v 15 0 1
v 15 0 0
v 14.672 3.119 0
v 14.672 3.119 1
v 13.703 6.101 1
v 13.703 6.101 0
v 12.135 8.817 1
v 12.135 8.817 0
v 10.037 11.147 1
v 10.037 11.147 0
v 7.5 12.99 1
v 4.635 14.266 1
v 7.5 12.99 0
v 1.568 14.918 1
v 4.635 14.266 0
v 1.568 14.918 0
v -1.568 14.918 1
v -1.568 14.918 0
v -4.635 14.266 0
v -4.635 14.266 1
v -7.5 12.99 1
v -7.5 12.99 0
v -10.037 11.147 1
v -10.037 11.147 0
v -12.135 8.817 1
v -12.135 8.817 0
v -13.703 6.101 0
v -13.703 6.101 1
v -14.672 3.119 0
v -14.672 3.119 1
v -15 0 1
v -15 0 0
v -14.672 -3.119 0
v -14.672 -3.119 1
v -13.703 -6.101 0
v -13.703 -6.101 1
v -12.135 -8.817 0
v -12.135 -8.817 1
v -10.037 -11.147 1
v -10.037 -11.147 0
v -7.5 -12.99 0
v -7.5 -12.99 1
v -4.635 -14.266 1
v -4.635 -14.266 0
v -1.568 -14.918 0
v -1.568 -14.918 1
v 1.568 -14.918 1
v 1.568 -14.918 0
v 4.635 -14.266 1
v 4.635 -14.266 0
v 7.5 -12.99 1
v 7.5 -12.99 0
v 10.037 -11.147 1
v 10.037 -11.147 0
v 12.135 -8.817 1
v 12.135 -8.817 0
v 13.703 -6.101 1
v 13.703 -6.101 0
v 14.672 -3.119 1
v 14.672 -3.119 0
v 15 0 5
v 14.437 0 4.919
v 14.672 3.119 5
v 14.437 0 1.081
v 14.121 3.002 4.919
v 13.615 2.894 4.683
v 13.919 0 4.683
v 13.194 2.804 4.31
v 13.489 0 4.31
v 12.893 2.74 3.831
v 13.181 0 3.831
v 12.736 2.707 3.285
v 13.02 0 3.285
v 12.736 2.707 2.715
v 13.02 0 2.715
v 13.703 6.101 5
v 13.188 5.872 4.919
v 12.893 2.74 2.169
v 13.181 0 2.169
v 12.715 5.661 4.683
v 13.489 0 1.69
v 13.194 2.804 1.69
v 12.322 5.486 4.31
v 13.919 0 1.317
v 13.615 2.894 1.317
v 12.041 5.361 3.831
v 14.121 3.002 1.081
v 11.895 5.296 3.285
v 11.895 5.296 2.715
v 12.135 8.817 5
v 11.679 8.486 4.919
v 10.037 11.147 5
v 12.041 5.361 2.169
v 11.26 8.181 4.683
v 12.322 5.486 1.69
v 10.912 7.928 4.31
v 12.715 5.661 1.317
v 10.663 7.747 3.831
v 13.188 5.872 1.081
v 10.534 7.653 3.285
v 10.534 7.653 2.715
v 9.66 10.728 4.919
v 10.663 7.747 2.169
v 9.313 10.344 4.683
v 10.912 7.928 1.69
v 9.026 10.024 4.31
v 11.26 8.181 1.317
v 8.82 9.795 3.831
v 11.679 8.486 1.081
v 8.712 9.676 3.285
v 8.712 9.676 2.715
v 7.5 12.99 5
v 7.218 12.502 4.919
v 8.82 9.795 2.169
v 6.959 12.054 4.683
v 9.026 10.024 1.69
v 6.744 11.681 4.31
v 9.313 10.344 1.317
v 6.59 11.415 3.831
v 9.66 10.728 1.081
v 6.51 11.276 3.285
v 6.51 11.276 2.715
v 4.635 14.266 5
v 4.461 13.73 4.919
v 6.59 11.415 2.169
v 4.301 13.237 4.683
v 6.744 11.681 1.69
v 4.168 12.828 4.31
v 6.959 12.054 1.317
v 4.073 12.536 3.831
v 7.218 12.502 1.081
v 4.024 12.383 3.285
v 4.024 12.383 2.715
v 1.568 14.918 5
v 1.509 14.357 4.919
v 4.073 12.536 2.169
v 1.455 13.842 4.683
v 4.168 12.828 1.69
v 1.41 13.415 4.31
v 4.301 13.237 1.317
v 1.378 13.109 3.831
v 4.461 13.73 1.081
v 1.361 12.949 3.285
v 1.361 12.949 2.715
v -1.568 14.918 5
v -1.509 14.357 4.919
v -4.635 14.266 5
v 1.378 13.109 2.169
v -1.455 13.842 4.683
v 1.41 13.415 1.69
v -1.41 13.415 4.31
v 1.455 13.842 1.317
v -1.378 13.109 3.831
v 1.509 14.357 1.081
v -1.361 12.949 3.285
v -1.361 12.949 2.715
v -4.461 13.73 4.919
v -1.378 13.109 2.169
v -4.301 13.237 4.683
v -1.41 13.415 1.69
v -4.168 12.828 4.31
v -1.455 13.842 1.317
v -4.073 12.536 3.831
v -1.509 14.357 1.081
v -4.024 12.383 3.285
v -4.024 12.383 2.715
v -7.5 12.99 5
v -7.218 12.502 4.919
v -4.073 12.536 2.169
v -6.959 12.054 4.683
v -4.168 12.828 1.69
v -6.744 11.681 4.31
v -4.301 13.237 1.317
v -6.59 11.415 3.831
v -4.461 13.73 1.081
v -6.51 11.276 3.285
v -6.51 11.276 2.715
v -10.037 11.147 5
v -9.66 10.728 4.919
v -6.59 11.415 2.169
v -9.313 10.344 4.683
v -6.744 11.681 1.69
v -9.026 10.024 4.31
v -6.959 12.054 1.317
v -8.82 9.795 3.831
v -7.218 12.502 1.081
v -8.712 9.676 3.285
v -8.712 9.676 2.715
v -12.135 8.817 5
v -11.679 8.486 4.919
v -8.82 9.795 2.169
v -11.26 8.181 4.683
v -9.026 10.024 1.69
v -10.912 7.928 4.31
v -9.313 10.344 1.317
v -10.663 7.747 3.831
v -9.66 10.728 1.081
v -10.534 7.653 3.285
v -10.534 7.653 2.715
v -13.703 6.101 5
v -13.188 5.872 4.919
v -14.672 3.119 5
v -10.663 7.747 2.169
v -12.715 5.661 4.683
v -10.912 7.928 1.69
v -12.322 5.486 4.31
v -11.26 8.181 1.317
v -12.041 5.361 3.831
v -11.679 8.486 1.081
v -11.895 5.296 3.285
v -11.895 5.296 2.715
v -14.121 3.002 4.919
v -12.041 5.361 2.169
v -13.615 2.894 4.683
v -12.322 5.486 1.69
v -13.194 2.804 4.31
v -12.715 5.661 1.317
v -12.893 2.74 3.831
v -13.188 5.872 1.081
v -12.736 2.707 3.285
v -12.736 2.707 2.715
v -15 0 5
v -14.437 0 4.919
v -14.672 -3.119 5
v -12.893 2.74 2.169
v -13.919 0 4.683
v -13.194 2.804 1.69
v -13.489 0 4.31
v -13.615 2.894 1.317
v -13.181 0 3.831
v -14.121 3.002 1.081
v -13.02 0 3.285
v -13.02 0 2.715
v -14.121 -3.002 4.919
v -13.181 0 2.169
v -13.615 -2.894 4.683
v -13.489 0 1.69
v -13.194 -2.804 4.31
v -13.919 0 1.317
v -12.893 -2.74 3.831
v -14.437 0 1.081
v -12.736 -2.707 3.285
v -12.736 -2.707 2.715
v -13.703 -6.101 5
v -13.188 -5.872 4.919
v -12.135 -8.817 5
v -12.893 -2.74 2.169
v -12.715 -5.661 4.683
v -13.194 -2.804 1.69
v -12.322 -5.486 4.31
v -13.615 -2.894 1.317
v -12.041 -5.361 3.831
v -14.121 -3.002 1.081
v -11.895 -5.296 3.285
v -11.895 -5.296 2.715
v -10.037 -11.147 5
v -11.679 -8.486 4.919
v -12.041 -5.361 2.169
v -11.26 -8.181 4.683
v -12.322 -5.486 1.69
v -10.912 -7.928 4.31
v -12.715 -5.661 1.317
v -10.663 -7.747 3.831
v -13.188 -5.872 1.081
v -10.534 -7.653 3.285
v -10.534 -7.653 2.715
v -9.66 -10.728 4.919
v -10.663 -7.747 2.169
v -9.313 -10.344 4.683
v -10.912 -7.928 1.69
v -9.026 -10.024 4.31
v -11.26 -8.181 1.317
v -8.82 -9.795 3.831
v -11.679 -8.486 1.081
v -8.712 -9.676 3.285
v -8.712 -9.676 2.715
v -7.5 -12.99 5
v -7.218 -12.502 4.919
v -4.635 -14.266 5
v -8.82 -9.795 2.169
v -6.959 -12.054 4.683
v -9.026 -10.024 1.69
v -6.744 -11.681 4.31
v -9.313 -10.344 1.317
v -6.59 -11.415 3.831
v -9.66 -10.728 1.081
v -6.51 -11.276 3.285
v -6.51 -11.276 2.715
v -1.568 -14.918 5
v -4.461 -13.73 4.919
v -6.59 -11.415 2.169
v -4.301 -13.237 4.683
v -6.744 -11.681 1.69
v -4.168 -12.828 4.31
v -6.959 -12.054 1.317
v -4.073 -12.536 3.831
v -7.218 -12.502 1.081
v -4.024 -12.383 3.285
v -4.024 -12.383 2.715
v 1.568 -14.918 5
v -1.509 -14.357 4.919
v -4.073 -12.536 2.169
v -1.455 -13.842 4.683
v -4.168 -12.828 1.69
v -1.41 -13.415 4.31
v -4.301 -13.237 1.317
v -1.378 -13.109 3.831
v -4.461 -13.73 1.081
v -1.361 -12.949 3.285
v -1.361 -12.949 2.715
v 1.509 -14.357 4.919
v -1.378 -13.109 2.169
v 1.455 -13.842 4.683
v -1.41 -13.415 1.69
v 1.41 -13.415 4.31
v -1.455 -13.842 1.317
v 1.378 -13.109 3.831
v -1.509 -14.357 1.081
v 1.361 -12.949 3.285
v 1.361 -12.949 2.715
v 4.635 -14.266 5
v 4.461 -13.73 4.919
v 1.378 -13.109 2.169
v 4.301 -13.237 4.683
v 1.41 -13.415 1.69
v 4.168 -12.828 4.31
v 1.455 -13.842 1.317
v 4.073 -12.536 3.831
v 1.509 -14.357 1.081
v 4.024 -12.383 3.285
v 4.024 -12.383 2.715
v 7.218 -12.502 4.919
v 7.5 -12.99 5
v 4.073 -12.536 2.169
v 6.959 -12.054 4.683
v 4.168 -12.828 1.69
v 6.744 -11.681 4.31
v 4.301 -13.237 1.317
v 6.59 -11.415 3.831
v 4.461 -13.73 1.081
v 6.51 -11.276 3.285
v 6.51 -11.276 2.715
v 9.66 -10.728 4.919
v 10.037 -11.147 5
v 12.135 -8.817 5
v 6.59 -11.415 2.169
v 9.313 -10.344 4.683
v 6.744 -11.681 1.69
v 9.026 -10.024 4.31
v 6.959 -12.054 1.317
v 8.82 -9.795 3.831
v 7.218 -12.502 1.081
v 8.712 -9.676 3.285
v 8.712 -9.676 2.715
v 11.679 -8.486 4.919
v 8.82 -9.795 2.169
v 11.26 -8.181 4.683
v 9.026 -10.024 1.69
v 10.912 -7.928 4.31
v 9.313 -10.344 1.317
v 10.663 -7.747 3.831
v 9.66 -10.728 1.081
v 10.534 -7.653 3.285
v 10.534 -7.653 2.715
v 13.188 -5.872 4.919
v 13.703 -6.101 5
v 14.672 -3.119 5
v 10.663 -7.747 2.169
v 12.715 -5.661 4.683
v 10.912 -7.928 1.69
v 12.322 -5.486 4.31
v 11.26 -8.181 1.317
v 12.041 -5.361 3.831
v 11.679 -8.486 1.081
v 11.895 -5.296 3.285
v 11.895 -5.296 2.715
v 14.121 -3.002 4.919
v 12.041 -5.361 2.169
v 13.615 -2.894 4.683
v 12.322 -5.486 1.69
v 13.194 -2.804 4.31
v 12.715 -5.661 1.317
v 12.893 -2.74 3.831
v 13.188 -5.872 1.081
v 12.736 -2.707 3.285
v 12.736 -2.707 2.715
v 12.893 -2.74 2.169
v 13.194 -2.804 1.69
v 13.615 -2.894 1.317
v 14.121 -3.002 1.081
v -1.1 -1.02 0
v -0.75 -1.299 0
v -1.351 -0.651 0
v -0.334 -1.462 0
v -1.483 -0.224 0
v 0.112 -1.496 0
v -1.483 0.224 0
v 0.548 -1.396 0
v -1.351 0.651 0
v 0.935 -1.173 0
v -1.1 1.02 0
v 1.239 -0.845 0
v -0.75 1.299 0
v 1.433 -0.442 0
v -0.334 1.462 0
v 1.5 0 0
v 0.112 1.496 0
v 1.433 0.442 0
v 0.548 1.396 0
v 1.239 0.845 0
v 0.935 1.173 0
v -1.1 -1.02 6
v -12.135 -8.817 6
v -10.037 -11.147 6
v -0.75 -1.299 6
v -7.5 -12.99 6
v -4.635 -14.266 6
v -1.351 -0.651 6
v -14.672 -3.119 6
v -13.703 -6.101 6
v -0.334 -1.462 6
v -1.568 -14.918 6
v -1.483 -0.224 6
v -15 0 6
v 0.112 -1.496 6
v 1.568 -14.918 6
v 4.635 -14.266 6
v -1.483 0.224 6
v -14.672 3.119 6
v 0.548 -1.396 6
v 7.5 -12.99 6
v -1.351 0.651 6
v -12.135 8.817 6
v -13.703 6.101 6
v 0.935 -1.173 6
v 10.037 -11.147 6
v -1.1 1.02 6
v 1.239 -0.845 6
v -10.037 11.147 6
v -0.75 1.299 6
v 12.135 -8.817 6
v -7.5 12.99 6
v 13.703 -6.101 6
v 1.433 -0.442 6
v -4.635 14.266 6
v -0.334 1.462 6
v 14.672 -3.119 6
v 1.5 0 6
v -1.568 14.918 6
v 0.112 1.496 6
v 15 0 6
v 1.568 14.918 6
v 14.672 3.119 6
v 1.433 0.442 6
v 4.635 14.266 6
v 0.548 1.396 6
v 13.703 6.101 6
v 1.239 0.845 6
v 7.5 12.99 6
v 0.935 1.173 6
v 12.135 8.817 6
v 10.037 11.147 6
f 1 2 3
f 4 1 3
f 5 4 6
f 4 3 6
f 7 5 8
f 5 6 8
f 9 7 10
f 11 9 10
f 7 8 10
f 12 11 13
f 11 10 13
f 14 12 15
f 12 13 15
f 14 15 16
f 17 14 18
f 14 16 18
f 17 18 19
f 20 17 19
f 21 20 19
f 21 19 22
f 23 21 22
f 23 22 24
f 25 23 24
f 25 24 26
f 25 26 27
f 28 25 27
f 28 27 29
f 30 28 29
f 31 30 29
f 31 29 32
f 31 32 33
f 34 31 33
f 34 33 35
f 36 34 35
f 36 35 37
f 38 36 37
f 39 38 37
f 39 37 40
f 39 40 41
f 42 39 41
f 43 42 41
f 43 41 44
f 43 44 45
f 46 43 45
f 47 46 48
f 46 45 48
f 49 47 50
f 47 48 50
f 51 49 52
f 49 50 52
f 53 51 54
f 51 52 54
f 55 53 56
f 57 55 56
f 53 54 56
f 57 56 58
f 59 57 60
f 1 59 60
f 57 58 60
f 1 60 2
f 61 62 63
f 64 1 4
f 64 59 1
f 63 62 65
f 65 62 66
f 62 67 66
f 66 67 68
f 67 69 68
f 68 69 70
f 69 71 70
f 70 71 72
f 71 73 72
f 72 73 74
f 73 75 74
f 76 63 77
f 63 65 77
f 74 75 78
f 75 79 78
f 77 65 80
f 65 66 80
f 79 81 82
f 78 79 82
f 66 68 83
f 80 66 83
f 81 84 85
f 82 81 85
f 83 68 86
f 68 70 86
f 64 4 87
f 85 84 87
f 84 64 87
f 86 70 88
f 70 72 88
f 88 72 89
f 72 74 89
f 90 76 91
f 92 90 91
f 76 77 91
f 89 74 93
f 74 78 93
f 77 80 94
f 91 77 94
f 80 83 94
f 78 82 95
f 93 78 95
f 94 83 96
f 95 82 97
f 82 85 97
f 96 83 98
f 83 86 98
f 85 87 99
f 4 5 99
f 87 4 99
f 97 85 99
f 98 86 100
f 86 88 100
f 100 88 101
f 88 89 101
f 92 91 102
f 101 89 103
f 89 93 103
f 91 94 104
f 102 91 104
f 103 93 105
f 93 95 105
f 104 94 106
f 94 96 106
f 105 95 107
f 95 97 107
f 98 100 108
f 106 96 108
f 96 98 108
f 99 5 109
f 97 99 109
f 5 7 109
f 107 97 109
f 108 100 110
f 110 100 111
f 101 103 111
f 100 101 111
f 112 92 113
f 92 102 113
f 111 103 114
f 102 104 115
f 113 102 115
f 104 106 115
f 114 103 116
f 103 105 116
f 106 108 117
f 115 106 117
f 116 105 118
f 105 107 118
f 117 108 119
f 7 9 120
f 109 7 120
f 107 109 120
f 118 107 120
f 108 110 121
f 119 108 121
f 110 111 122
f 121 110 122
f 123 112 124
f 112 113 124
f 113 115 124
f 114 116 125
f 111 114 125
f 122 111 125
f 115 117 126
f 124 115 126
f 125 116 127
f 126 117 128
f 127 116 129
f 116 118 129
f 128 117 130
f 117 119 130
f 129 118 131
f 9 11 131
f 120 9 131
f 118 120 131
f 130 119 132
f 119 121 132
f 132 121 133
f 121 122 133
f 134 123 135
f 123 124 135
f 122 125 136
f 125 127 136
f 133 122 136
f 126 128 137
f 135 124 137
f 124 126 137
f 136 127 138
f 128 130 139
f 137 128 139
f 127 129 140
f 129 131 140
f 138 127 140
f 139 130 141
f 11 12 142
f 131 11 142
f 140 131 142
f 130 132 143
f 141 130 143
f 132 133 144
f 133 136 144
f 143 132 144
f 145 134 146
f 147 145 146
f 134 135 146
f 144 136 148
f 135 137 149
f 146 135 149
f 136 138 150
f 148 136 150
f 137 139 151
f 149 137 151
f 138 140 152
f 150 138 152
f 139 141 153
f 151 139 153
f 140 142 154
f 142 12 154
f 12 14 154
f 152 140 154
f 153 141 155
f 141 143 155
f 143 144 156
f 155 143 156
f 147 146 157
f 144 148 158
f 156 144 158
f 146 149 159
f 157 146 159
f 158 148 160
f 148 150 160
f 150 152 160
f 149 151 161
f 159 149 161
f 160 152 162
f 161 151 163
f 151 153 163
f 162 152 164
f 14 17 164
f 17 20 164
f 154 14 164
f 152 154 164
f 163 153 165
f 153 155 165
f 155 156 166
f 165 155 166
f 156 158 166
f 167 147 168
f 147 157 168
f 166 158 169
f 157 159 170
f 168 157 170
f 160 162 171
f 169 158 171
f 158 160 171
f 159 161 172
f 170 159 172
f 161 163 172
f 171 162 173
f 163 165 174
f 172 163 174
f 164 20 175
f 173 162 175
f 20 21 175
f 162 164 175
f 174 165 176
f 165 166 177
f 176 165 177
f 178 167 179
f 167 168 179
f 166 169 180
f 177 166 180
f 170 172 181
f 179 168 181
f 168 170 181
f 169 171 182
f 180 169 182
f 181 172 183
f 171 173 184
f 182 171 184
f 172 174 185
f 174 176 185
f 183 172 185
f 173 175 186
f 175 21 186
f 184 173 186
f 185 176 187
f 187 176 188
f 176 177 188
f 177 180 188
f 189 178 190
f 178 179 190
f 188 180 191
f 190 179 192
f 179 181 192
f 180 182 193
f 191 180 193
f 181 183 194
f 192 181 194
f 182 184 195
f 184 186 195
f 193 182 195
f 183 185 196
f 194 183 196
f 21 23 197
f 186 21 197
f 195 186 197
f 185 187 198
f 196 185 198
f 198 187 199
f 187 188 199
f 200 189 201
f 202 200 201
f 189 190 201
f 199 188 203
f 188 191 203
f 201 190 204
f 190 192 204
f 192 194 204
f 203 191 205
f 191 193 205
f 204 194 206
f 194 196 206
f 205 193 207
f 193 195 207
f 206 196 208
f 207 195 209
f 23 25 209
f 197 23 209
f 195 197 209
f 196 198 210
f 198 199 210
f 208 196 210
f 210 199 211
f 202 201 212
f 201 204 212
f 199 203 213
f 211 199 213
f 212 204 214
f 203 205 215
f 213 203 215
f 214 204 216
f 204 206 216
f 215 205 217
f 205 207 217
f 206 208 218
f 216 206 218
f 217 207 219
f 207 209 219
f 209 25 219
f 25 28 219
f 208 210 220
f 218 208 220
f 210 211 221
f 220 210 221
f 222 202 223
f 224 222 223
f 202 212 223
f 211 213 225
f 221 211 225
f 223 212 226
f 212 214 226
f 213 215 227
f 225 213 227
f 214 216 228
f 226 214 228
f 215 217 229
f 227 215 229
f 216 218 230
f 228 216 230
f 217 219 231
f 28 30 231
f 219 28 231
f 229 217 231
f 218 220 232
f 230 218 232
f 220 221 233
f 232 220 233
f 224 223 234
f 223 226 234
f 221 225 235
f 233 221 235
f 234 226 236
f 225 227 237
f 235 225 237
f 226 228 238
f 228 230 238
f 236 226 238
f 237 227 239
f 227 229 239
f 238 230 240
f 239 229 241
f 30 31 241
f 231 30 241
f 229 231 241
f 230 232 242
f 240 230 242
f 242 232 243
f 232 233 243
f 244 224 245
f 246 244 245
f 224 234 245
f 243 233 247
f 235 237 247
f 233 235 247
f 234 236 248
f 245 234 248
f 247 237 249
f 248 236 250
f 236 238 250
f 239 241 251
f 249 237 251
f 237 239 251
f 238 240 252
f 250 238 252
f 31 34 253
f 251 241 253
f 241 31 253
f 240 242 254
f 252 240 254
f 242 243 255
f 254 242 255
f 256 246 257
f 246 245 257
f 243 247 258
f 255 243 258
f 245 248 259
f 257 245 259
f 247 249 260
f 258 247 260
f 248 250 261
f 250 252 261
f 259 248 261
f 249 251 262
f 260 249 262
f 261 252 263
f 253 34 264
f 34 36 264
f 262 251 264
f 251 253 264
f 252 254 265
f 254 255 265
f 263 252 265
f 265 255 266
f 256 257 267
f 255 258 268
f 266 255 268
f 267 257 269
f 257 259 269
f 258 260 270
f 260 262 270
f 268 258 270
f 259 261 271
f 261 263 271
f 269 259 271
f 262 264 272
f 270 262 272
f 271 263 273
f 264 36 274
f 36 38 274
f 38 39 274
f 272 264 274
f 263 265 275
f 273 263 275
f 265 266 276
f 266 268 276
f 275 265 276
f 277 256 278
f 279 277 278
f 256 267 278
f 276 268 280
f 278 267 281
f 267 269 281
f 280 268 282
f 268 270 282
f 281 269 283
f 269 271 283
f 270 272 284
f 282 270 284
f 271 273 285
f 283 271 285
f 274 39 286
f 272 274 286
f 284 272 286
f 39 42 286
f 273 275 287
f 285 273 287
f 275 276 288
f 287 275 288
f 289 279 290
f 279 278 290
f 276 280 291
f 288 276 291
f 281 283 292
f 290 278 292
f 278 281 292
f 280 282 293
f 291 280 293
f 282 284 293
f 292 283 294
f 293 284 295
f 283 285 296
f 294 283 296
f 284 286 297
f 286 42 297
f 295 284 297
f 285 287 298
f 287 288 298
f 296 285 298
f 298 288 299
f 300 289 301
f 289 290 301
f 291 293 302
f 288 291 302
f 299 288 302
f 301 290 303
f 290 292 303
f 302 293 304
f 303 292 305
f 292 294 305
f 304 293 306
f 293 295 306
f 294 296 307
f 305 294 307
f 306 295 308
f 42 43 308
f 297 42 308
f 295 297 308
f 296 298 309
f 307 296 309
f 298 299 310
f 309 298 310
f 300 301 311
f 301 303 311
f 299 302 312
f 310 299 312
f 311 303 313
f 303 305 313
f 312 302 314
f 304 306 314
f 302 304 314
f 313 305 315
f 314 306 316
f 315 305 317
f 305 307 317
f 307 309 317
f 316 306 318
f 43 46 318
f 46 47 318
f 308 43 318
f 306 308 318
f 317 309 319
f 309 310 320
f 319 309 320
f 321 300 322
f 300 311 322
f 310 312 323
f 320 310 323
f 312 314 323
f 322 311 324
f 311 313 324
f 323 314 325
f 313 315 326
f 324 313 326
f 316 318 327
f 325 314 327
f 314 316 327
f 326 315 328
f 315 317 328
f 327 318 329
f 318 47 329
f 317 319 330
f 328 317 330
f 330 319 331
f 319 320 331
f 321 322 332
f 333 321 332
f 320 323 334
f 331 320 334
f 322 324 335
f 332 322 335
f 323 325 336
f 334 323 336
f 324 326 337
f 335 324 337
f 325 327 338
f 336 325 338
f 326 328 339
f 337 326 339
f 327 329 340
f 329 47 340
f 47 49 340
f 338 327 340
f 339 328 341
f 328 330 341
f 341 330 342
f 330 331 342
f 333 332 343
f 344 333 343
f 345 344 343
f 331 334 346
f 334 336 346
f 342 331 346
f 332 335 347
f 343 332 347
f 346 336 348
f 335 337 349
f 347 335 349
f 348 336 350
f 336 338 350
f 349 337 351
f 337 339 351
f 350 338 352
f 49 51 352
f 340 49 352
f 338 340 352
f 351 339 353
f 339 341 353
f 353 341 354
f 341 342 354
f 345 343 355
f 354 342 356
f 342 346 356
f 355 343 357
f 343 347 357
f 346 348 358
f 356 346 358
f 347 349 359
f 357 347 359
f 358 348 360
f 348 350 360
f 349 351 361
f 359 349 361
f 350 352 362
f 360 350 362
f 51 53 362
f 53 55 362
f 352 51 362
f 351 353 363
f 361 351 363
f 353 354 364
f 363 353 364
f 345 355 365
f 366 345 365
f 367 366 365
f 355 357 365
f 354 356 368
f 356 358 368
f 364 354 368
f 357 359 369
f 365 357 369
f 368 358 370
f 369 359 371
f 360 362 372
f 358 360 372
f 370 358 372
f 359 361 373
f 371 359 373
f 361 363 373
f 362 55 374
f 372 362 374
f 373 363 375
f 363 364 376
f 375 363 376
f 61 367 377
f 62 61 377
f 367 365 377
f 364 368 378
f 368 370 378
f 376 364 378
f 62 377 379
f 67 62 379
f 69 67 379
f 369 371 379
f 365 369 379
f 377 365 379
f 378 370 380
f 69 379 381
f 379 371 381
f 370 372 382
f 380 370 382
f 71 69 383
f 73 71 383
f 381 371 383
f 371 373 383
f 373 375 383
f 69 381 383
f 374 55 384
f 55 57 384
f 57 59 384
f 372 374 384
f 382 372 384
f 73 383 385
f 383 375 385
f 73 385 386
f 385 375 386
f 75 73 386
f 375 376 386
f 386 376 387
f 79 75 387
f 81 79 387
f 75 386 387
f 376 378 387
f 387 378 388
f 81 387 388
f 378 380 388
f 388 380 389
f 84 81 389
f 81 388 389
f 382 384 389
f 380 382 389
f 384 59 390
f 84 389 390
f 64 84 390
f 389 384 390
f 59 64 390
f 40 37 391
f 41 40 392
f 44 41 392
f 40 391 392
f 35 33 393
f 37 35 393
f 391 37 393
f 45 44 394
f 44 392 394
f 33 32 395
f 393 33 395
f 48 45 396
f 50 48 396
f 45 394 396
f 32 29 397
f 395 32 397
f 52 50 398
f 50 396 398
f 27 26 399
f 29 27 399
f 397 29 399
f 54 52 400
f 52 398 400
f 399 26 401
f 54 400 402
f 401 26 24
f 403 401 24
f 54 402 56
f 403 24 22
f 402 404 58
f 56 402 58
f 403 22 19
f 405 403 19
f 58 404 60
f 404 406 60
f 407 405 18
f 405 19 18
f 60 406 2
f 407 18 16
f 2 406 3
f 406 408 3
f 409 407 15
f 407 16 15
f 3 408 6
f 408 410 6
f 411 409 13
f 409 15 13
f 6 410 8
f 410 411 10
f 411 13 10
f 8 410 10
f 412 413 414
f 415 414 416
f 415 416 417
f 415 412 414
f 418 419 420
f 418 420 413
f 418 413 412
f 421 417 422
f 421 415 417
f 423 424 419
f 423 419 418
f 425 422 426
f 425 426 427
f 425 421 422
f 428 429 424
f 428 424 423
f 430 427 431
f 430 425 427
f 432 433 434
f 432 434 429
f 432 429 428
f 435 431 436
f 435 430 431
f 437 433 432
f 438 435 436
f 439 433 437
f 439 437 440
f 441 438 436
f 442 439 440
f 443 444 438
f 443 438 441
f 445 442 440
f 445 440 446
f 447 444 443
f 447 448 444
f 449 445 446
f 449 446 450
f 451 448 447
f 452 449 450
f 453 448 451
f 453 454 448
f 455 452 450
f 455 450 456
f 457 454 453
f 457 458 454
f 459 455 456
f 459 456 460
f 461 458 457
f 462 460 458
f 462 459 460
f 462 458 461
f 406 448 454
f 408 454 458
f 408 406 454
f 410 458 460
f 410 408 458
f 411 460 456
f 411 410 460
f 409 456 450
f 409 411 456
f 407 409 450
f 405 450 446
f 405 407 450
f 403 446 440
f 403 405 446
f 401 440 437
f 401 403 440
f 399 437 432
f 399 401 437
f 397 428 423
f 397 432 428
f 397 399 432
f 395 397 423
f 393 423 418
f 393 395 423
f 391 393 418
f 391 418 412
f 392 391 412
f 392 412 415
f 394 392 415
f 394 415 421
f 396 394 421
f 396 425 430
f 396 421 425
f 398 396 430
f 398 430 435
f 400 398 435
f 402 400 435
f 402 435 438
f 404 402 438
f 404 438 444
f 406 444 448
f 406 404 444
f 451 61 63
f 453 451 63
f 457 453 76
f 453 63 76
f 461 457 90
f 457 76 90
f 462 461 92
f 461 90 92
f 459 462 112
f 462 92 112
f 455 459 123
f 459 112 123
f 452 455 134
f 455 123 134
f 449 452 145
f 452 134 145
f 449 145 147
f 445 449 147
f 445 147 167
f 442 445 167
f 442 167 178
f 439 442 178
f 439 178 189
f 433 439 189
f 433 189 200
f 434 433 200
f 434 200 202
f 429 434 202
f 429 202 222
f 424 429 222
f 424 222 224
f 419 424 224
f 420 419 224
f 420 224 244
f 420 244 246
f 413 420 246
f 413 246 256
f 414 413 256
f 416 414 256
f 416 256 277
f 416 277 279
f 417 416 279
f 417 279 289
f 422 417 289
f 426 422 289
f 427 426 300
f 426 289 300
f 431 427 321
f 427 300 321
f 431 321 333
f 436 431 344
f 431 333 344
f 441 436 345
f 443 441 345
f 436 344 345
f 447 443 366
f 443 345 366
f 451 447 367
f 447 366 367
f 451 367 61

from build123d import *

# Parameters (mm, degrees)
CYLINDER001_R     = 1.5
CYLINDER001_DEPTH = 10
TORUS_R           = 2
CYLINDER_R        = 15
CYLINDER_DEPTH    = 6


with BuildPart() as cilindro001:
    # Cylinder001 → Cylinder001 (new body)
    with BuildSketch(Plane.XY):
        Circle(CYLINDER001_R)
    extrude(amount=CYLINDER001_DEPTH)


with BuildPart() as toro:
    # Torus → Torus (revolve)
    with BuildSketch(Plane(origin=(0, 0, 3), x_dir=(1, 0, 0), z_dir=(0, -1, 0))):
        with Locations((15, 0)):
            Circle(TORUS_R)
    revolve(axis=Axis((0, 0, 3), (0, 0, 1)))


with BuildPart() as cut001:
    # Cylinder → Cylinder (new body)
    with BuildSketch(Plane.XY):
        Circle(CYLINDER_R)
    extrude(amount=CYLINDER_DEPTH)

    # Cut: cut Toro
    add(toro.part, mode=Mode.SUBTRACT)

    # Cut001: cut Cilindro001
    add(cilindro001.part, mode=Mode.SUBTRACT)


solid = cut001.part
